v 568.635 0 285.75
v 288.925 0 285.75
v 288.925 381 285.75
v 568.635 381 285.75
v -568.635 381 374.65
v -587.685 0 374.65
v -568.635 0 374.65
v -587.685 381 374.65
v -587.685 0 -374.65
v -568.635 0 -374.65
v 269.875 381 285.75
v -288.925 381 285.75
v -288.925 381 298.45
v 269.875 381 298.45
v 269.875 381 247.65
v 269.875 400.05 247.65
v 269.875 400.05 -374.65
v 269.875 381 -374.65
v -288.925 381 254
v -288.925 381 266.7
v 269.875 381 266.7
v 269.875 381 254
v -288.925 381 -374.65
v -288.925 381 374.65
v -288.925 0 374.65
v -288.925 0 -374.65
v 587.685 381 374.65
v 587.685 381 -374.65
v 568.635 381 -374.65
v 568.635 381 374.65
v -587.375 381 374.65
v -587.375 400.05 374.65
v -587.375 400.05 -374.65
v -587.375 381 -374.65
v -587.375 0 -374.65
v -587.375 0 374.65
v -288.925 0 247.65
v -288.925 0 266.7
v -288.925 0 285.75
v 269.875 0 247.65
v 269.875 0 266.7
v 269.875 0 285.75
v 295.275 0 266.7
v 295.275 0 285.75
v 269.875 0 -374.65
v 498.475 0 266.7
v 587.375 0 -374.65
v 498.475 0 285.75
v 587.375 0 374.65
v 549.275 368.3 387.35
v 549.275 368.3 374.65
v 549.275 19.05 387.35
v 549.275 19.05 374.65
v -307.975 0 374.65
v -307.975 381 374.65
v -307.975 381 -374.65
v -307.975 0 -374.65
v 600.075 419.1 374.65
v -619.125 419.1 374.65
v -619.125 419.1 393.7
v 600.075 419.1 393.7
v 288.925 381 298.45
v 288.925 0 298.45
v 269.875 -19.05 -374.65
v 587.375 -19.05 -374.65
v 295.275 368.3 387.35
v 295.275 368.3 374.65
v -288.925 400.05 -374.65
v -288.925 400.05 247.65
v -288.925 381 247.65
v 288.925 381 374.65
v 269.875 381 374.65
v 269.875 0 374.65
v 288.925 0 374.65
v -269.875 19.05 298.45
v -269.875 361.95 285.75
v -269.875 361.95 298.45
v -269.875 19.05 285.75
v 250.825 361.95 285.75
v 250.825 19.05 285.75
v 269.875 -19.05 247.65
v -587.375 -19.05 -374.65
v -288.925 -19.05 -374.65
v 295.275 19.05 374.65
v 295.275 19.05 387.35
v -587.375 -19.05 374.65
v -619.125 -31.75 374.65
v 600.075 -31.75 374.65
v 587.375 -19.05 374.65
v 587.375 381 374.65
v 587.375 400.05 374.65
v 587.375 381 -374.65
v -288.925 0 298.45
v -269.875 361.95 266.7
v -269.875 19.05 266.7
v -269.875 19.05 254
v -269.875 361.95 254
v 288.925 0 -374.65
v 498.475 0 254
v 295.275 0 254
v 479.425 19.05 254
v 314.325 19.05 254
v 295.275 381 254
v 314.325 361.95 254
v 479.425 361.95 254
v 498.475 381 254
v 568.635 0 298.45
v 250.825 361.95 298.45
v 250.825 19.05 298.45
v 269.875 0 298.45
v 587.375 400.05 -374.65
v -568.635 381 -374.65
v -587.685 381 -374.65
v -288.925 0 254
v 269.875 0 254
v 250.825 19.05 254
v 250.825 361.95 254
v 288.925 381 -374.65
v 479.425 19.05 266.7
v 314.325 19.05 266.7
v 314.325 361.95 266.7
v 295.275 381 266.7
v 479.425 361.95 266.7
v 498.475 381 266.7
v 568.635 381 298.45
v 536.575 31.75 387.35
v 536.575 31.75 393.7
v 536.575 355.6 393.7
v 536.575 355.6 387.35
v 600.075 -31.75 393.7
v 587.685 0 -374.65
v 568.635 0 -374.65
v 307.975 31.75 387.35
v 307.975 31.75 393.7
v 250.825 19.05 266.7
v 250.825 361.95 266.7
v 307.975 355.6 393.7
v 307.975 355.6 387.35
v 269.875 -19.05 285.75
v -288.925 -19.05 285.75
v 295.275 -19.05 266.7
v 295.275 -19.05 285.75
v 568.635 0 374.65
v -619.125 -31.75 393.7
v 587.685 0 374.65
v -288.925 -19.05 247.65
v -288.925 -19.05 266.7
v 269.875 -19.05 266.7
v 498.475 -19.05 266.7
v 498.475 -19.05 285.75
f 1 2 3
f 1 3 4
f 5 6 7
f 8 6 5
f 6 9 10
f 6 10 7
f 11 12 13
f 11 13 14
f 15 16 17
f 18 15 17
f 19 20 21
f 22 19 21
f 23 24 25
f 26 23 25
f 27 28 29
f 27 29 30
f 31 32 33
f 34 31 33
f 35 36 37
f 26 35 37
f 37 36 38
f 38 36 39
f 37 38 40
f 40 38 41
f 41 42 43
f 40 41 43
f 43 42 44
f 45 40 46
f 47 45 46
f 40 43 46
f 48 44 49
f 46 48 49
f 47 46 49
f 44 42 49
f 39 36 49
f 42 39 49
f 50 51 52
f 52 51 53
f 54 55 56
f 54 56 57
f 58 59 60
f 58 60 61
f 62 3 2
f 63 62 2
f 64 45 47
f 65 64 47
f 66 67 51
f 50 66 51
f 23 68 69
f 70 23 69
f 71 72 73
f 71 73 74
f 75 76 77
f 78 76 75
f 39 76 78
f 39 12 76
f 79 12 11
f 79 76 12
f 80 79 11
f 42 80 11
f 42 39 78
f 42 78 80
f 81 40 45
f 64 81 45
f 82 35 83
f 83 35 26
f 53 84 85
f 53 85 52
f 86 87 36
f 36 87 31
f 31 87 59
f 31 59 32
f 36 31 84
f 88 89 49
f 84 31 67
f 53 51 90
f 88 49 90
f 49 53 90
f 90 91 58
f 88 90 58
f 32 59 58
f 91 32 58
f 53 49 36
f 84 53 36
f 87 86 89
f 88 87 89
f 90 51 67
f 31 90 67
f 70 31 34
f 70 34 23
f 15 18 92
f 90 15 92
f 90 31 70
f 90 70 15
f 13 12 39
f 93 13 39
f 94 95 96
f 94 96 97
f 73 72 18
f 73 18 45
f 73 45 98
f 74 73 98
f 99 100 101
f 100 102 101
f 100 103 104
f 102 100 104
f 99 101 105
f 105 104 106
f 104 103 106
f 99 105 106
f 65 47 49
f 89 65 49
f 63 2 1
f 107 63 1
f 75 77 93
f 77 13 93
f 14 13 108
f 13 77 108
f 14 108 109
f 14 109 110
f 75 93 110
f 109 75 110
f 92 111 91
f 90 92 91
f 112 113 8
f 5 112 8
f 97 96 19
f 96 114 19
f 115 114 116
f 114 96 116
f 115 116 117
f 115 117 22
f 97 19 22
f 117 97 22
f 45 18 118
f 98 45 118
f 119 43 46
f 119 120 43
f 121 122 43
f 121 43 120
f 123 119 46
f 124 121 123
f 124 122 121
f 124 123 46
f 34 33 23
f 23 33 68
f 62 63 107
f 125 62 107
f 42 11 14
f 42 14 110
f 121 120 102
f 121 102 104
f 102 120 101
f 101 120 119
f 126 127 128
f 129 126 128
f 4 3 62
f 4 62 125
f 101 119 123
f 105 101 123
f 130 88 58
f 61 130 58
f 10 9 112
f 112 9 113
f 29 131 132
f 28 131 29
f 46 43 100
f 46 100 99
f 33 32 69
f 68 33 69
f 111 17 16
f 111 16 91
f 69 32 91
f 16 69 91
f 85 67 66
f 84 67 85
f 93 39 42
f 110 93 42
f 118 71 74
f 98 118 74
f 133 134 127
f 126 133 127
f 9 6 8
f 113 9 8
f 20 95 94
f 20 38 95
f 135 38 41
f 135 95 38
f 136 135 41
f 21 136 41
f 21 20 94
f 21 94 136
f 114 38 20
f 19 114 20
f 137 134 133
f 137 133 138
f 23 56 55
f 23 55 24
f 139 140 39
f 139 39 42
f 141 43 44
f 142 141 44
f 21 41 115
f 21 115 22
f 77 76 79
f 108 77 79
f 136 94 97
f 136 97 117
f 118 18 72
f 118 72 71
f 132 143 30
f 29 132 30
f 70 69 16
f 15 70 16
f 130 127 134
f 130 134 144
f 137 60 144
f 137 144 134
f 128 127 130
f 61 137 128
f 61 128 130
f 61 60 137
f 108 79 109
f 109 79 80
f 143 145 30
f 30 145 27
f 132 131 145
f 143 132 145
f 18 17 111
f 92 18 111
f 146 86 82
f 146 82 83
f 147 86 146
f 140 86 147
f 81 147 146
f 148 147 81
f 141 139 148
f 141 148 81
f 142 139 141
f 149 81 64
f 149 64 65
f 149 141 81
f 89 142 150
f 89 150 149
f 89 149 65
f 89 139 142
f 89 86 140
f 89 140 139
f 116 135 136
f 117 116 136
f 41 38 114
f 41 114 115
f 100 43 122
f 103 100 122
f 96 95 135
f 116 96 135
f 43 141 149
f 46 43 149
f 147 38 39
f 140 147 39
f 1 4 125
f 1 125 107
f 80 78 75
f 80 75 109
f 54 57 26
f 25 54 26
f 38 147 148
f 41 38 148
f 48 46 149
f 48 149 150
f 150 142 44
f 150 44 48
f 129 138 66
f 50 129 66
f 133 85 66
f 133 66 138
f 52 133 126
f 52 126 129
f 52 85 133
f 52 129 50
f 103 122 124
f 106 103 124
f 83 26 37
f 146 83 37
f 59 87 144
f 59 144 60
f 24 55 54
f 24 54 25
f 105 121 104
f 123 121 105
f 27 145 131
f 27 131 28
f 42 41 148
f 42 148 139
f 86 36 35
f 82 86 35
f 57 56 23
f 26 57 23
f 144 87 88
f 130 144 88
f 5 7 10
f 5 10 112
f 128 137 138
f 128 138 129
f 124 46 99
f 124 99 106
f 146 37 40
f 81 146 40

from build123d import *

# Parameters (mm, degrees)
F1_DEPTH  = 19.05
F2_W      = 1219.2
F2_H      = 450.85
F3_DEPTH  = 19.05
F6_DEPTH  = 19.05
F9_W      = 381
F9_H      = 749.3
F10_DEPTH = 19.05
F11_W     = 381
F11_H     = 749.3
F12_DEPTH = 19.05
F13_W     = 558.8
F13_H     = 19.05
F14_DEPTH = 19.05
F15_W     = 203.2
F15_H     = 19.05
F16_DEPTH = 19.05
F17_W     = 228.6
F17_H     = 323.85
F18_DEPTH = 19.05
F19_W     = 558.8
F19_H     = 381
F19_W_2   = 520.7
F19_H_2   = 342.9
F19_W_3   = 279.70988
F20_DEPTH = 12.7
F21_W     = 558.8
F21_H     = 381
F21_W_2   = 520.7
F21_H_2   = 342.9
F21_W_3   = 203.2
F21_W_4   = 165.1
F22_DEPTH = 12.7
F23_W     = 19.05
F23_H     = 381
F24_DEPTH = 749.3
F25_W     = 254
F25_H     = 349.25
F26_DEPTH = 12.7


with BuildPart() as f1:
    # F0 (on Front) → F1 (new body)
    with BuildSketch(Plane.XZ):
        Polygon((587.375, -374.65), (587.375, 374.65), (-587.375, 374.65), (-587.375, -374.65), (-288.925, -374.65), (-288.925, 247.65), (269.875, 247.65), (269.875, -374.65), align=None)
    extrude(amount=F1_DEPTH)

    # F2 (on face) → F3 (join)
    with BuildSketch(Plane.XY.offset(374.65)):
        with Locations((-9.525, 193.675)):
            Rectangle(F2_W, F2_H)
    extrude(amount=F3_DEPTH)

    # F5 (on offset) → F6 (join)
    with BuildSketch(Plane.XZ.offset(-400.05)):
        Polygon((587.375, 374.65), (-587.375, 374.65), (-587.375, -374.65), (-288.925, -374.65), (-288.925, 247.65), (269.875, 247.65), (269.875, -374.65), (587.375, -374.65), align=None)
    extrude(amount=F6_DEPTH)

    # F13 (on face) → F14 (cut)
    with BuildSketch(Plane.XZ.offset(19.05)):
        with Locations((-9.525, 276.225)):
            Rectangle(F13_W, F13_H)
    extrude(amount=-F14_DEPTH, mode=Mode.SUBTRACT)

    # F15 (on face) → F16 (cut)
    with BuildSketch(Plane.XZ.offset(19.05)):
        with Locations((396.875, 276.225)):
            Rectangle(F15_W, F15_H)
    extrude(amount=-F16_DEPTH, mode=Mode.SUBTRACT)

    # F17 (on face) → F18 (cut)
    with BuildSketch(Plane.XY.offset(393.7)):
        with Locations((422.275, 193.675)):
            Rectangle(F17_W, F17_H)
    extrude(amount=-F18_DEPTH, mode=Mode.SUBTRACT)

    # F25 (on face) → F26 (cut)
    with BuildSketch(Plane(origin=(0, 0, 374.65), x_dir=(1, 0, 0), z_dir=(0, 0, -1))):
        with Locations((422.275, -193.675)):
            Rectangle(F25_W, F25_H)
    extrude(amount=-F26_DEPTH, mode=Mode.SUBTRACT)


with BuildPart() as f10:
    # F9 (on offset) → F10 (new body)
    with BuildSketch(Plane.YZ.offset(-587.68488)):
        with Locations((190.5, 0)):
            Rectangle(F9_W, F9_H)
    extrude(amount=F10_DEPTH)


with BuildPart() as f12:
    # F11 (on offset) → F12 (new body)
    with BuildSketch(Plane.YZ.offset(587.68488)):
        with Locations((190.5, 0)):
            Rectangle(F11_W, F11_H)
    extrude(amount=-F12_DEPTH)


with BuildPart() as f20:
    # F19 (on face) → F20 (new body)
    with BuildSketch(Plane(origin=(0, 0, 285.75), x_dir=(1, 0, 0), z_dir=(0, 0, -1))):
        with Locations((-9.525, -190.5)):
            Rectangle(F19_W, F19_H)
        with Locations((-9.525, -190.5)):
            Rectangle(F19_W_2, F19_H_2, mode=Mode.SUBTRACT)
        with Locations((428.77994, -190.5)):
            Rectangle(F19_W_3, F19_H)
    extrude(amount=-F20_DEPTH)


with BuildPart() as f22:
    # F21 (on face) → F22 (new body)
    with BuildSketch(Plane.XY.offset(266.7)):
        with Locations((-9.525, 190.5)):
            Rectangle(F21_W, F21_H)
        with Locations((-9.525, 190.5)):
            Rectangle(F21_W_2, F21_H_2, mode=Mode.SUBTRACT)
        with Locations((396.875, 190.5)):
            Rectangle(F21_W_3, F21_H)
        with Locations((396.875, 190.5)):
            Rectangle(F21_W_4, F21_H_2, mode=Mode.SUBTRACT)
    extrude(amount=-F22_DEPTH)


with BuildPart() as f24:
    # F23 (on face) → F24 (new body)
    with BuildSketch(Plane(origin=(0, 0, 374.65), x_dir=(1, 0, 0), z_dir=(0, 0, -1))):
        with Locations((-298.45, -190.5)):
            Rectangle(F23_W, F23_H)
        with Locations((279.4, -190.5)):
            Rectangle(F23_W, F23_H)
    extrude(amount=F24_DEPTH)


solid = Compound([f1.part, f10.part, f12.part, f20.part, f22.part, f24.part])
